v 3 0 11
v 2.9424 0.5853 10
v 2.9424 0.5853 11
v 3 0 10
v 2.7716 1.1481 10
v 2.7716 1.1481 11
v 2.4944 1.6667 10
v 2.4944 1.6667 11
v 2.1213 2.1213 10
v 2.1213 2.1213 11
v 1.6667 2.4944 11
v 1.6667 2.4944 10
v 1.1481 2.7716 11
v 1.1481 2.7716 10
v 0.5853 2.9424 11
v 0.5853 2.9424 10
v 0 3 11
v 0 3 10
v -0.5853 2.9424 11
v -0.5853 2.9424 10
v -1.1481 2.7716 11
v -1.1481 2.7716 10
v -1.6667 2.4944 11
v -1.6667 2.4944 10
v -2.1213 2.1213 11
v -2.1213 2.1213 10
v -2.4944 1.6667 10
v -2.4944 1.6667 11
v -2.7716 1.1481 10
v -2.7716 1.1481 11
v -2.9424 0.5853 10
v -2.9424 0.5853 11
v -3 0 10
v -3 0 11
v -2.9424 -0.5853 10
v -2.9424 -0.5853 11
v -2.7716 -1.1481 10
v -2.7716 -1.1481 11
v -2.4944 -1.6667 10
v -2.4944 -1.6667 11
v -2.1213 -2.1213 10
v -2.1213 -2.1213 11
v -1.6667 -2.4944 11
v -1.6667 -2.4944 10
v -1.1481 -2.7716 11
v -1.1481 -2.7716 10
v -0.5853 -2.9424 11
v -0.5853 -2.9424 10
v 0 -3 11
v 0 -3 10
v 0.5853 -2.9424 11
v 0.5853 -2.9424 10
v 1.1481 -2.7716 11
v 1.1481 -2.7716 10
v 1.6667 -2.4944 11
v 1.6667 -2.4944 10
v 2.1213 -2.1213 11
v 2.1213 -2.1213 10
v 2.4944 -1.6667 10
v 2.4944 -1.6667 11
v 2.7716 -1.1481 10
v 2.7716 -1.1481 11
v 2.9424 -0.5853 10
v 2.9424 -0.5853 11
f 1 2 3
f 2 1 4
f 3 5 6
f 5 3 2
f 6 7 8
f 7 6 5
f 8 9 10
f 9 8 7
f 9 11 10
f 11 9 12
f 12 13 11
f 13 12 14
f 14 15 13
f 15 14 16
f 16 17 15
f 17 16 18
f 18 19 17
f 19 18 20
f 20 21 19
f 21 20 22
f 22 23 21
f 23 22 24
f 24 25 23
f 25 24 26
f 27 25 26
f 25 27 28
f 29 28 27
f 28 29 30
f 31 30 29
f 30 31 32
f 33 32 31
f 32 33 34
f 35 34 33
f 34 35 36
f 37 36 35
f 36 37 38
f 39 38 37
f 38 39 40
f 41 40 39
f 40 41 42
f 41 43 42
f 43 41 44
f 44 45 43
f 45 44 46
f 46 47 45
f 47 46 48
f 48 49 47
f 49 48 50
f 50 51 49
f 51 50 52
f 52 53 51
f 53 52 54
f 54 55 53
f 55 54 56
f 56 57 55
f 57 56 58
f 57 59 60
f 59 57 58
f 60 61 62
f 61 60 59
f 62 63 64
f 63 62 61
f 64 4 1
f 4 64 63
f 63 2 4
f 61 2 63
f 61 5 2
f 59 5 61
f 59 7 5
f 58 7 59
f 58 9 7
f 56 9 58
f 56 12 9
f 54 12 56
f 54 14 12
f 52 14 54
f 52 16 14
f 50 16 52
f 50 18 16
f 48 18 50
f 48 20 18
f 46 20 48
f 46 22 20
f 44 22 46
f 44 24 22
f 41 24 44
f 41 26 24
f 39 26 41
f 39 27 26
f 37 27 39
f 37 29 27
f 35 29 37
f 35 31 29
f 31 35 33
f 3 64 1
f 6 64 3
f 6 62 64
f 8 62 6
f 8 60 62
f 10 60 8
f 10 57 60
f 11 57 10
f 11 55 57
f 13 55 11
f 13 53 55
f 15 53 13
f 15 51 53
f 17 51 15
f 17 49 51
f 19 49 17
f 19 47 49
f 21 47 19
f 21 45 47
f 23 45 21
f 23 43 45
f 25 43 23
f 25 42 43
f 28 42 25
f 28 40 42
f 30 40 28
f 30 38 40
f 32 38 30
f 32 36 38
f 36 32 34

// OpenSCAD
// file: ../../screw-post/screw-post.scad
//-----------------------------------------------------------------------
// Screw post: a round post off the floor that a board screws down onto
//
// Two ways to fix:
//   "nut"  clearance hole through the post and floor; the nut sits in a hex
//          trap in the floor's underside, so the screw goes in from the top
//   "tap"  a pilot hole the screw cuts its own thread in (one or two fittings
//          in PLA/PETG); blind, the floor stays whole underneath
// and "head" for a screw up from below (head in a counterbore, nut on top).
//
// Modules, all in the same frame:
//   screwPostGhost()     the screw (and nut), for previews
//   screwPost()          the post: add to the floor
//   screwPostFloorCut()  subtract from the floor: nut trap / counterbore and hole
//
// Frame: origin on the floor top, on the post's axis. Z up; the floor is
// Z = -floorThick .. 0. Units: mm.
//
// Sizes: "M2", "M2.5", "M3". screwPostScrew(size, ...) says which screw length
// reaches, so a project can assert it has that screw in the kit.
//-----------------------------------------------------------------------

//-- [name, screw Ø, nut across flats, nut thick, head Ø, head height, tap hole, post Ø]
//-- Nuts ISO 4032; heads ISO 7380 button. Tap holes: the usual ~0.8 x Ø for plastic
screwSizes = [
  ["M2",   2.0, 4.0, 1.6, 3.5, 1.1, 1.6, 5.0],
  ["M2.5", 2.5, 5.0, 2.0, 4.4, 1.4, 2.1, 6.0],    // head 4.4: measured on the kit's M2.5 (controller base)
  ["M3",   3.0, 5.5, 2.4, 5.7, 1.65, 2.5, 7.0],
];

screwHoleClear = 0.4;     // added to the screw Ø for a clearance hole
screwNutClear  = 0.3;     // CAL: across flats, nut trap over the nut. Set by the fit piece
screwTapClear  = 0.0;     // CAL: added to the tap hole. Set by the fit piece
screwHeadClear = 0.6;     // counterbore over the head Ø

function screwSize(size) = let (i = search([size], screwSizes)[0])
  assert(i != [] && i != undef, str("unknown screw size ", size)) screwSizes[i];
function screwDia(size)    = screwSize(size)[1];
function screwNutAF(size)  = screwSize(size)[2];
function screwNutH(size)   = screwSize(size)[3];
function screwHeadDia(size)= screwSize(size)[4];
function screwHeadH(size)  = screwSize(size)[5];
function screwPostDia(size)= screwSize(size)[7];

//-- Shortest screw that fills the nut, from the top of the clamped part (h + clamp
//-- above the floor) down to the nut trap's underside. Round up to a length you have.
function screwPostScrew(size, h, floorThick, clamp = 1.6) = h + clamp + floorThick;

module screwPostGhost(size, h, floorThick, clamp = 1.6, length, how = "nut")
{
  d = screwDia(size);
  L = is_undef(length) ? screwPostScrew(size, h, floorThick, clamp) : length;
  top = h + clamp;
  if (how == "head")
  {
    %color("Silver") translate([0, 0, -floorThick]) cylinder(d = screwHeadDia(size), h = screwHeadH(size), $fn = 24);
    %color("Silver") translate([0, 0, -floorThick + screwHeadH(size)]) cylinder(d = d, h = L, $fn = 16);
  }
  else
  {
    %color("Silver") translate([0, 0, top]) cylinder(d = screwHeadDia(size), h = screwHeadH(size), $fn = 24);
    %color("Silver") translate([0, 0, top - L]) cylinder(d = d, h = L, $fn = 16);
    if (how == "nut")
      %color("DimGray") translate([0, 0, -floorThick]) rotate([0, 0, 30]) cylinder(d = screwNutAF(size)/cos(30), h = screwNutH(size), $fn = 6);
  }
}

//-- how: "nut" | "head" (through hole) or "tap" (blind pilot hole). postDia defaults by size
module screwPost(size, h, how = "nut", postDia, tapClear = screwTapClear)
{
  pd = is_undef(postDia) ? screwPostDia(size) : postDia;
  hole = how == "tap" ? screwSize(size)[6] + tapClear : screwDia(size) + screwHoleClear;
  difference()
  {
    translate([0, 0, -0.01]) cylinder(d = pd, h = h + 0.01, $fn = 40);
    translate([0, 0, how == "tap" ? 0.6 : -1]) cylinder(d = hole, h = h + 2, $fn = 24);
    //-- lead-in so the screw starts square
    translate([0, 0, h - 0.4]) cylinder(d1 = hole, d2 = hole + 0.8, h = 0.41, $fn = 24);
  }
}

//-- "nut": hex trap from the underside, opening a little over the nut so it sits flush.
//-- "head": counterbore for the head. "tap": nothing.
module screwPostFloorCut(size, floorThick, how = "nut", nutClear = screwNutClear)
{
  d = screwDia(size) + screwHoleClear;
  if (how == "nut")
  {
    af = screwNutAF(size) + nutClear;
    translate([0, 0, -floorThick - 1]) rotate([0, 0, 30]) cylinder(d = af/cos(30), h = screwNutH(size) + 0.1 + 1, $fn = 6);
    translate([0, 0, -floorThick - 1]) cylinder(d = d + 0.4, h = floorThick + 2, $fn = 24);
  }
  if (how == "head")
  {
    translate([0, 0, -floorThick - 1]) cylinder(d = screwHeadDia(size) + screwHeadClear, h = screwHeadH(size) + 0.2 + 1, $fn = 32);
    translate([0, 0, -floorThick - 1]) cylinder(d = d + 0.4, h = floorThick + 2, $fn = 24);
  }
  assert(how == "tap" || floorThick >= (how == "nut" ? screwNutH(size) : screwHeadH(size)) + 0.1 + 0.3,
         str("floor too thin for the ", size, " ", how));
}
// file: ../as5600-mount.scad
//-----------------------------------------------------------------------
// AS5600 magnetic encoder board, held under a magnet on a spindle tip
//
// The board lies component side up, the AS5600 facing the magnet above it.
// Four screw posts take its weight: stainless M2.5 screws come UP from below,
// heads in counterbores in the floor's underside, with a stainless washer
// and nut on top of the board (stainless: carbon steel near the magnet
// bends its field). Four corner lips round the board's outline locate it:
// the holes are oversize and not placed well enough to hold the magnet
// axis within 0.25 of the IC, so they only clamp. Round boards get three
// arc lips instead of corners.
//
// The post height comes from the magnet: as56PostH(magnetFaceZ) puts the
// IC's top `gap` below the magnet's face.
//
// Modules, all in the same frame:
//   as56Ghost()      the board, IC and magnet, for previews
//   as56Holder()     the plastic: four posts and the locating lips
//   as56FloorCut()   subtract from the floor: counterbores and holes (and
//                    a slot for header pins pointing down, if asked)
//
// Frame: origin on the floor top, on the magnet axis (the IC's centre).
// Z up; the floor is Z = -floorThick .. 0. Board edges along X and Y.
// Units: mm.
//
// Boards come from as56Boards by name, or pass a row of your own in the
// same layout. Magnets come from as56Magnets by name, or pass a thickness.
//-----------------------------------------------------------------------

use <../screw-post/screw-post.scad>

//-- Boards: [name, shape, size, pcb, holes, hole Ø, screw, source]
//-- shape "rect": size [x, y]; "round": size [Ø]. Holes [x, y] from the IC's centre,
//-- which is the magnet axis; hole Ø one per hole (ghost only: the lips locate).
as56Boards = [
  //-- DollaTek B0BGPF3WT3 / JYUDAUFU B0DJ77DS4J, measured 2026-10-21 (the controller project's parts sheet).
  //-- 3 x Ø3.5 + 1 x Ø4.0 (by DIR); hole edges 1.75 in, so centres 3.5 in, 16.0 pitch; IC centred
  ["as5600-23",  "rect", [23, 23],   1.6, [[-8, -8], [8, -8], [-8, 8], [8, 8]], [3.5, 3.5, 3.5, 4.0], "M2.5", "measured"],
  //-- small breakout, 20 x 13.5, 2 x M3 holes on 15 pitch (vendor listing). CAL: PCB, hole Ø, IC centred
  ["as5600-20",  "rect", [20, 13.5], 1.6, [[-7.5, 0], [7.5, 0]],                [3.2, 3.2],           "M2.5", "V, CAL"],
  //-- round board: placeholder only, no source found. CAL: everything
  ["round-cal",  "round", [20],      1.6, [[-7, 0], [7, 0]],                    [3.2, 3.2],           "M2.5", "CAL"],
];

//-- Magnets: [name, Ø, thickness], diametrically magnetised discs
as56Magnets = [
  ["6x2.5", 6, 2.5],    // the size usually bundled with AS5600 boards. CAL what's in the packs
  ["6x1",   6, 1.0],    // the BOM's separate discs; the controller project's base default. CAL
];

//-- The sensor (AS5600 datasheet)
as56IcL        = 4.9;     // SOIC-8 body
as56IcW        = 3.9;
as56IcH        = 1.75;    // max, PCB to package top
as56Gap        = 1.5;     // magnet face to package top: datasheet 0.5..3; 1.5 mid-range
as56AxisTol    = 0.25;    // magnet axis to IC centre, max (datasheet)

//-- The mount
as56Clearance  = 0.15;    // CAL: per side, board outline to lips. Set by the fit piece
as56LipWall    = 1.6;
as56LipLeg     = 5;       // rect boards: lip length along each edge from a corner
as56LipArc     = 40;      // round boards: degrees per lip, three lips
as56LipH       = 1.0;     // lip top above the PCB underside (under the PCB top: nothing to snag)
as56FloorThick = 2.0;     // takes the M2.5 head counterbore (1.4 head + 0.2, 0.3 left)
as56WasherT    = 0.5;     // M2.5 washer, ISO 7089: Ø6 x 0.5
as56WasherD    = 6.0;
as56HeaderSlot = [17, 9]; // floor opening for header pins out the back: clears the rows at x -6.8 / +6.41

function as56Row(table, name) = let (i = search([name], table)[0])
  assert(i != [] && i != undef, str("unknown AS5600 name ", name)) table[i];
function as56Board(board) = is_string(board) ? as56Row(as56Boards, board) : board;
function as56MagnetT(magnet) = is_string(magnet) ? as56Row(as56Magnets, magnet)[2] : magnet;
function as56MagnetD(magnet) = is_string(magnet) ? as56Row(as56Magnets, magnet)[1] : 6;

//-- Magnet face Z for a magnet stuck on a spindle tip at tipZ (both above the floor top)
function as56MagnetFaceZ(tipZ, magnet = "6x1") = tipZ - as56MagnetT(magnet);
//-- Post height (floor top to PCB underside) that puts the IC's top `gap` under the magnet face
function as56PostH(magnetFaceZ, gap = as56Gap, board = "as5600-23") =
  magnetFaceZ - gap - as56IcH - as56Board(board)[3];
//-- Shortest screw (length under the head) from the head, flush in the floor's underside,
//-- up through the post, PCB, washer and nut. Round up to a length you have
function as56Screw(postH, floorThick = as56FloorThick, board = "as5600-23") =
  let (b = as56Board(board), s = b[6])
  floorThick - screwHeadH(s) + postH + b[3] + as56WasherT + screwNutH(s);
//-- Z of a screw's tip above the floor top: keep it clear of the magnet and spindle
function as56ScrewTipZ(length, floorThick = as56FloorThick, board = "as5600-23") =
  -floorThick + screwHeadH(as56Board(board)[6]) + length;

module as56Outline(board, grow = 0)
{
  b = as56Board(board);
  if (b[1] == "round") offset(r = grow, $fn = 64) circle(d = b[2][0], $fn = 64);
  else offset(delta = grow) square(b[2], center = true);
}

//-- where the lips go: corners of a rect board, three arcs round a round one
module as56LipZones(board, clearance)
{
  b = as56Board(board);
  R = 50;
  if (b[1] == "round")
    for (a = [90, 210, 330]) rotate(a - as56LipArc/2)
      polygon([[0, 0], [R, 0], for (t = [0 : 5 : as56LipArc]) R*[cos(t), sin(t)], R*[cos(as56LipArc), sin(as56LipArc)]]);
  else
    for (sx = [-1, 1], sy = [-1, 1])
    {
      leg = min(as56LipLeg, min(b[2])/2 - 1);
      translate([sx*b[2][0]/2, sy*b[2][1]/2])
        mirror([sx < 0 ? 1 : 0, 0]) mirror([0, sy < 0 ? 1 : 0])
          translate([-leg, -leg]) square([leg + clearance + as56LipWall + 1, leg + clearance + as56LipWall + 1]);
    }
}

//-- postH: floor top to PCB underside (as56PostH). magnetFaceZ: for the ghost's magnet
module as56Ghost(postH, board = "as5600-23", magnet = "6x1", gap = as56Gap)
{
  b = as56Board(board);
  %color("Purple") difference()
  {
    translate([0, 0, postH]) linear_extrude(b[3]) as56Outline(board);
    for (i = [0 : len(b[4]) - 1]) translate([b[4][i][0], b[4][i][1], postH - 1]) cylinder(d = b[5][i], h = b[3] + 2, $fn = 20);
  }
  %color("Black") translate([-as56IcL/2, -as56IcW/2, postH + b[3]]) cube([as56IcL, as56IcW, as56IcH]);
  %color("Silver") translate([0, 0, postH + b[3] + as56IcH + gap]) cylinder(d = as56MagnetD(magnet), h = as56MagnetT(magnet), $fn = 32);
}

module as56Holder(postH, board = "as5600-23", clearance = as56Clearance, lipH = as56LipH)
{
  b = as56Board(board);
  for (h = b[4]) translate([h[0], h[1], 0]) screwPost(b[6], postH, "head");
  //-- lips, sunk 0.01 into the floor so they don't come out as loose bodies
  translate([0, 0, -0.01]) linear_extrude(postH + lipH + 0.01)
    intersection()
    {
      difference() { as56Outline(board, clearance + as56LipWall); as56Outline(board, clearance); }
      as56LipZones(board, clearance);
    }
}

//-- headers: also cut a slot for header pins pointing down out of the board's back
module as56FloorCut(floorThick = as56FloorThick, board = "as5600-23", headers = false)
{
  b = as56Board(board);
  for (h = b[4]) translate([h[0], h[1], 0]) screwPostFloorCut(b[6], floorThick, "head");
  for (h = b[4]) assert(!headers || abs(h[0]) - screwPostDia(b[6])/2 >= as56HeaderSlot[0]/2
                         || abs(h[1]) - screwPostDia(b[6])/2 >= as56HeaderSlot[1]/2, "header slot runs into a post");
  if (headers) translate([-as56HeaderSlot[0]/2, -as56HeaderSlot[1]/2, -floorThick - 1])
    cube([as56HeaderSlot[0], as56HeaderSlot[1], floorThick + 2]);
}
// main file
// The magnet on the spindle tip, as a solid, for the catalogue.
include <../as5600-mount.scad>

tipZ = 11; magnet = "6x1";
translate([0, 0, as56MagnetFaceZ(tipZ, magnet)]) cylinder(d = as56MagnetD(magnet), h = as56MagnetT(magnet), $fn = 32);
